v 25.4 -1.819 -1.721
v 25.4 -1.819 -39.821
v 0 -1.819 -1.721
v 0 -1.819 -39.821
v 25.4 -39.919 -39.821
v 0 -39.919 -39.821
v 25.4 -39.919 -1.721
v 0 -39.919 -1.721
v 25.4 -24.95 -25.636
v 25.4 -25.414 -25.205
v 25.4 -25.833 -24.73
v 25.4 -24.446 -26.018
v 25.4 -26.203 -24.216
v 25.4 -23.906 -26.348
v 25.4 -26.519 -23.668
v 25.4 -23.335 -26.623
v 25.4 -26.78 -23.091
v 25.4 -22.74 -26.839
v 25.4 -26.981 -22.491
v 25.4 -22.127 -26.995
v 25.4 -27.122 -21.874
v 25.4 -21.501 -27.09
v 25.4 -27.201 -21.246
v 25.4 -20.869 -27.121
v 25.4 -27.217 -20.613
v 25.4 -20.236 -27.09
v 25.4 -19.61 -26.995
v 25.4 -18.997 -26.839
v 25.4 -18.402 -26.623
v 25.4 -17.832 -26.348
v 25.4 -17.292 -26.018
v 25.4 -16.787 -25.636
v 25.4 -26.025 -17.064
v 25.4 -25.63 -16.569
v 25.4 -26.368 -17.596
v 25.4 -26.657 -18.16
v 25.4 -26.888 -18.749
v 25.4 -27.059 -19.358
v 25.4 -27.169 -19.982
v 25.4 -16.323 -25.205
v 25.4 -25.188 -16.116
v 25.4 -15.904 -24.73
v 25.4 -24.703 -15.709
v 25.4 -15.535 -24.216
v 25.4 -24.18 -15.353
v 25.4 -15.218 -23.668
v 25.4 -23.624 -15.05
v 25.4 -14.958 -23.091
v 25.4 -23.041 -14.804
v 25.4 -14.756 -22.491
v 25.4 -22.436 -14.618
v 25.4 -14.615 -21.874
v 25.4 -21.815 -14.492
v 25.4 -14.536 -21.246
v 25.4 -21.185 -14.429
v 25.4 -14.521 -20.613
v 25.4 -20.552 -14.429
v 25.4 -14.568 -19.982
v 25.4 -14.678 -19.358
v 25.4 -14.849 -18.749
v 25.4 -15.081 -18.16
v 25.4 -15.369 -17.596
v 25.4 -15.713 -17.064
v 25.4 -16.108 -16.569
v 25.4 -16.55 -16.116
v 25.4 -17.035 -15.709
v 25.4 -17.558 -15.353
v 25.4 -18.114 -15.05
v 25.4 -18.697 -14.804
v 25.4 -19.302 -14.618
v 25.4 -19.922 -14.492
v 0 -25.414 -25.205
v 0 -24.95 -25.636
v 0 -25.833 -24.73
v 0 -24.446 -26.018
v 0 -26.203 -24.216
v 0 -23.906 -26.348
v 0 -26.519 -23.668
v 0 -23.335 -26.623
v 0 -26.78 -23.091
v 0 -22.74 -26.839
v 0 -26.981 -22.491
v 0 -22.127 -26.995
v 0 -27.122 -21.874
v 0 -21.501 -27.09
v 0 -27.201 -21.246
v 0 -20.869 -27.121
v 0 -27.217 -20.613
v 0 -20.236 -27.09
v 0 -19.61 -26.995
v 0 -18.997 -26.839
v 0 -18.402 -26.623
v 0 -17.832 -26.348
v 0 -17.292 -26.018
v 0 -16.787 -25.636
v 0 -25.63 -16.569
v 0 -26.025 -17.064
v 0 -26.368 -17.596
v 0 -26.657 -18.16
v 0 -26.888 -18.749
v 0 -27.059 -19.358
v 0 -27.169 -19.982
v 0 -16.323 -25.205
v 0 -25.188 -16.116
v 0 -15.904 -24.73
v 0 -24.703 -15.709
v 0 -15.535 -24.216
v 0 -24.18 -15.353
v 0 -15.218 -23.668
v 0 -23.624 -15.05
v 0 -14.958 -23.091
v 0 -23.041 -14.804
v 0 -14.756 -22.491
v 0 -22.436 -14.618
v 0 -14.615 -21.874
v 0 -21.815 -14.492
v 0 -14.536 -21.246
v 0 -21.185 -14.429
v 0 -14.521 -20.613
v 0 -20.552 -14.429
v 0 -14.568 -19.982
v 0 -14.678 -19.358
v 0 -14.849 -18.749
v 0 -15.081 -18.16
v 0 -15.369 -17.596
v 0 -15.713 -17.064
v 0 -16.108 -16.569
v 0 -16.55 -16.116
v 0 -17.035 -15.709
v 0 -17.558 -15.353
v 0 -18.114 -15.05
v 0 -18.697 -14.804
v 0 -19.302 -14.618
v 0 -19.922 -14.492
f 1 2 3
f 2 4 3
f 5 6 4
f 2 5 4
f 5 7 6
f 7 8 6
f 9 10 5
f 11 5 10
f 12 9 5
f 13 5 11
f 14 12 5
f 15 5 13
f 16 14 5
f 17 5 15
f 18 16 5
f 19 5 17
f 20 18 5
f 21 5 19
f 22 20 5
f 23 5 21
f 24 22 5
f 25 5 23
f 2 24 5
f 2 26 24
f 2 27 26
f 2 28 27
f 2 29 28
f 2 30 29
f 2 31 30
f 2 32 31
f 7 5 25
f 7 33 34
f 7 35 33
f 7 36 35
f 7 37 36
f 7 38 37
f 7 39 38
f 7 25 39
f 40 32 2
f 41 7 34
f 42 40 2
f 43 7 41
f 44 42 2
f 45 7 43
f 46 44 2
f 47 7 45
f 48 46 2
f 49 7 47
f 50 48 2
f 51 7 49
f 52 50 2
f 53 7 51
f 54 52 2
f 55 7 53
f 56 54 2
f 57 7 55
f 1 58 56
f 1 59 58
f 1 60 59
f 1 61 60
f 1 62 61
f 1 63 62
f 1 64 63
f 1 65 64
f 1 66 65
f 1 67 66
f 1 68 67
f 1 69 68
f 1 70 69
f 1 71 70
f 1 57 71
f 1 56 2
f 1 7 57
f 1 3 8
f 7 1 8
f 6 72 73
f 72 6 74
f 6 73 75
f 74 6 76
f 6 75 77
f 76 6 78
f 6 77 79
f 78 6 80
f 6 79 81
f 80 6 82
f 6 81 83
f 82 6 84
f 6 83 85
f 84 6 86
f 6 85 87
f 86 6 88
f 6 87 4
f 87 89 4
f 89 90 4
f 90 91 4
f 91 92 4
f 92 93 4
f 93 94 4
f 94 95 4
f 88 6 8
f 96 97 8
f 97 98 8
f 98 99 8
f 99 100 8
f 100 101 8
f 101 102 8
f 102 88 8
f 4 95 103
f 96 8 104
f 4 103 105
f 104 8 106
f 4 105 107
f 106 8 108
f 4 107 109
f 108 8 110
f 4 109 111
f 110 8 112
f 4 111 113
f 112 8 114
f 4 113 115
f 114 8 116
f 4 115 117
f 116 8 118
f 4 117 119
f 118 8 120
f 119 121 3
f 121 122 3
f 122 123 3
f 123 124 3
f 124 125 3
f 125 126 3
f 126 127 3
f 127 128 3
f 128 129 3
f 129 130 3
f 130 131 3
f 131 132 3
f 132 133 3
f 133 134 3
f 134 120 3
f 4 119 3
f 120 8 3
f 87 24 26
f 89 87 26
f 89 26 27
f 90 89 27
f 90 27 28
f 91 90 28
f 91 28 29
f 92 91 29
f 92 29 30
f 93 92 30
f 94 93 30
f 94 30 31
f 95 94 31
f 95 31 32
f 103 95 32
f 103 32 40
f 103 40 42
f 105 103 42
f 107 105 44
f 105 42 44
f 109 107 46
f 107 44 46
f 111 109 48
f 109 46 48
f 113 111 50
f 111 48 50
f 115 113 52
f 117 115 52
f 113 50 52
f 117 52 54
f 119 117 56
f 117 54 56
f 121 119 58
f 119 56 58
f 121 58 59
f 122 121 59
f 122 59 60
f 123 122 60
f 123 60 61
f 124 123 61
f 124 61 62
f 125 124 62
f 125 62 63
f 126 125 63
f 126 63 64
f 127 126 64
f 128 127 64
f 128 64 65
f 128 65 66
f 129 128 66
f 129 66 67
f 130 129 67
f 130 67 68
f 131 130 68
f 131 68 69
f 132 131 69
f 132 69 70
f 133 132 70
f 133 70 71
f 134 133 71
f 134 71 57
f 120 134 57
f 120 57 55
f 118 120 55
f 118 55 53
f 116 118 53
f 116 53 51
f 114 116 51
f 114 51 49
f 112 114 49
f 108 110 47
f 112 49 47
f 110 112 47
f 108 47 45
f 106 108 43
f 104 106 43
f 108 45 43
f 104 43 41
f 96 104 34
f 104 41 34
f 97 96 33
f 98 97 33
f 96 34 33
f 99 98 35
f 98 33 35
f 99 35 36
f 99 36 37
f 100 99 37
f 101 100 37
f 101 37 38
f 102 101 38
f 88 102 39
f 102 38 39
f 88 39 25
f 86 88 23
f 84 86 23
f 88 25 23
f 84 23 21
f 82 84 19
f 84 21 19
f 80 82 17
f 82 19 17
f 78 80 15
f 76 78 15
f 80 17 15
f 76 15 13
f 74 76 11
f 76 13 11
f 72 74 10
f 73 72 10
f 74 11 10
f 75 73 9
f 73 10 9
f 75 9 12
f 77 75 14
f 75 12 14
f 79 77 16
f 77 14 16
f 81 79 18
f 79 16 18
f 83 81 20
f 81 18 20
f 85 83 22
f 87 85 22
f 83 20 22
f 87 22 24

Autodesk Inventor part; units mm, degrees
ref_plane "YZ Plane" through (0, 0, 0) normal (1, 0, 0) x (0, 1, 0)
ref_plane "XZ Plane" through (0, 0, 0) normal (0, 1, 0) x (-1, 0, 0)
ref_plane "XY Plane" through (0, 0, 0) normal (0, 0, 1) x (1, 0, 0)
sketch "Sketch1" plane through (0, 0, 0) normal (1, 0, 0) x (0, 1, 0)
  line L0 (-1.8187, -1.7212) -> (-39.9187, -1.7212)
  line L1 (-39.9187, -1.7212) -> (-39.9187, -39.8212)
  line L2 (-39.9187, -39.8212) -> (-1.8187, -39.8212)
  line L3 (-1.8187, -39.8212) -> (-1.8187, -1.7212)
  point P0 (0, 0)
  dimension "d0" = 38.1
  dimension "d1" = 38.1
extrude "Extrusion1" add sketch "Sketch1" along normal blind 25.4
sketch "Sketch2" plane through (25.4, 0, 0) normal (1, 0, 0) x (0, 0, -1)
  circle A0 centre (20.7712, -20.8687) radius 6.35
  line L0 (39.8212, -1.8187) -> (1.7212, -1.8187) projected
  line L1 (1.7212, -1.8187) -> (1.7212, -39.9187) projected
  point P0 (0, 0)
  dimension "d4" = 12.7
  dimension "d5" = 19.05
  dimension "d6" = 19.05
extrude "Extrusion2" cut sketch "Sketch2" against normal blind 25.4
properties part number "nut" material "PPS Plastic"
